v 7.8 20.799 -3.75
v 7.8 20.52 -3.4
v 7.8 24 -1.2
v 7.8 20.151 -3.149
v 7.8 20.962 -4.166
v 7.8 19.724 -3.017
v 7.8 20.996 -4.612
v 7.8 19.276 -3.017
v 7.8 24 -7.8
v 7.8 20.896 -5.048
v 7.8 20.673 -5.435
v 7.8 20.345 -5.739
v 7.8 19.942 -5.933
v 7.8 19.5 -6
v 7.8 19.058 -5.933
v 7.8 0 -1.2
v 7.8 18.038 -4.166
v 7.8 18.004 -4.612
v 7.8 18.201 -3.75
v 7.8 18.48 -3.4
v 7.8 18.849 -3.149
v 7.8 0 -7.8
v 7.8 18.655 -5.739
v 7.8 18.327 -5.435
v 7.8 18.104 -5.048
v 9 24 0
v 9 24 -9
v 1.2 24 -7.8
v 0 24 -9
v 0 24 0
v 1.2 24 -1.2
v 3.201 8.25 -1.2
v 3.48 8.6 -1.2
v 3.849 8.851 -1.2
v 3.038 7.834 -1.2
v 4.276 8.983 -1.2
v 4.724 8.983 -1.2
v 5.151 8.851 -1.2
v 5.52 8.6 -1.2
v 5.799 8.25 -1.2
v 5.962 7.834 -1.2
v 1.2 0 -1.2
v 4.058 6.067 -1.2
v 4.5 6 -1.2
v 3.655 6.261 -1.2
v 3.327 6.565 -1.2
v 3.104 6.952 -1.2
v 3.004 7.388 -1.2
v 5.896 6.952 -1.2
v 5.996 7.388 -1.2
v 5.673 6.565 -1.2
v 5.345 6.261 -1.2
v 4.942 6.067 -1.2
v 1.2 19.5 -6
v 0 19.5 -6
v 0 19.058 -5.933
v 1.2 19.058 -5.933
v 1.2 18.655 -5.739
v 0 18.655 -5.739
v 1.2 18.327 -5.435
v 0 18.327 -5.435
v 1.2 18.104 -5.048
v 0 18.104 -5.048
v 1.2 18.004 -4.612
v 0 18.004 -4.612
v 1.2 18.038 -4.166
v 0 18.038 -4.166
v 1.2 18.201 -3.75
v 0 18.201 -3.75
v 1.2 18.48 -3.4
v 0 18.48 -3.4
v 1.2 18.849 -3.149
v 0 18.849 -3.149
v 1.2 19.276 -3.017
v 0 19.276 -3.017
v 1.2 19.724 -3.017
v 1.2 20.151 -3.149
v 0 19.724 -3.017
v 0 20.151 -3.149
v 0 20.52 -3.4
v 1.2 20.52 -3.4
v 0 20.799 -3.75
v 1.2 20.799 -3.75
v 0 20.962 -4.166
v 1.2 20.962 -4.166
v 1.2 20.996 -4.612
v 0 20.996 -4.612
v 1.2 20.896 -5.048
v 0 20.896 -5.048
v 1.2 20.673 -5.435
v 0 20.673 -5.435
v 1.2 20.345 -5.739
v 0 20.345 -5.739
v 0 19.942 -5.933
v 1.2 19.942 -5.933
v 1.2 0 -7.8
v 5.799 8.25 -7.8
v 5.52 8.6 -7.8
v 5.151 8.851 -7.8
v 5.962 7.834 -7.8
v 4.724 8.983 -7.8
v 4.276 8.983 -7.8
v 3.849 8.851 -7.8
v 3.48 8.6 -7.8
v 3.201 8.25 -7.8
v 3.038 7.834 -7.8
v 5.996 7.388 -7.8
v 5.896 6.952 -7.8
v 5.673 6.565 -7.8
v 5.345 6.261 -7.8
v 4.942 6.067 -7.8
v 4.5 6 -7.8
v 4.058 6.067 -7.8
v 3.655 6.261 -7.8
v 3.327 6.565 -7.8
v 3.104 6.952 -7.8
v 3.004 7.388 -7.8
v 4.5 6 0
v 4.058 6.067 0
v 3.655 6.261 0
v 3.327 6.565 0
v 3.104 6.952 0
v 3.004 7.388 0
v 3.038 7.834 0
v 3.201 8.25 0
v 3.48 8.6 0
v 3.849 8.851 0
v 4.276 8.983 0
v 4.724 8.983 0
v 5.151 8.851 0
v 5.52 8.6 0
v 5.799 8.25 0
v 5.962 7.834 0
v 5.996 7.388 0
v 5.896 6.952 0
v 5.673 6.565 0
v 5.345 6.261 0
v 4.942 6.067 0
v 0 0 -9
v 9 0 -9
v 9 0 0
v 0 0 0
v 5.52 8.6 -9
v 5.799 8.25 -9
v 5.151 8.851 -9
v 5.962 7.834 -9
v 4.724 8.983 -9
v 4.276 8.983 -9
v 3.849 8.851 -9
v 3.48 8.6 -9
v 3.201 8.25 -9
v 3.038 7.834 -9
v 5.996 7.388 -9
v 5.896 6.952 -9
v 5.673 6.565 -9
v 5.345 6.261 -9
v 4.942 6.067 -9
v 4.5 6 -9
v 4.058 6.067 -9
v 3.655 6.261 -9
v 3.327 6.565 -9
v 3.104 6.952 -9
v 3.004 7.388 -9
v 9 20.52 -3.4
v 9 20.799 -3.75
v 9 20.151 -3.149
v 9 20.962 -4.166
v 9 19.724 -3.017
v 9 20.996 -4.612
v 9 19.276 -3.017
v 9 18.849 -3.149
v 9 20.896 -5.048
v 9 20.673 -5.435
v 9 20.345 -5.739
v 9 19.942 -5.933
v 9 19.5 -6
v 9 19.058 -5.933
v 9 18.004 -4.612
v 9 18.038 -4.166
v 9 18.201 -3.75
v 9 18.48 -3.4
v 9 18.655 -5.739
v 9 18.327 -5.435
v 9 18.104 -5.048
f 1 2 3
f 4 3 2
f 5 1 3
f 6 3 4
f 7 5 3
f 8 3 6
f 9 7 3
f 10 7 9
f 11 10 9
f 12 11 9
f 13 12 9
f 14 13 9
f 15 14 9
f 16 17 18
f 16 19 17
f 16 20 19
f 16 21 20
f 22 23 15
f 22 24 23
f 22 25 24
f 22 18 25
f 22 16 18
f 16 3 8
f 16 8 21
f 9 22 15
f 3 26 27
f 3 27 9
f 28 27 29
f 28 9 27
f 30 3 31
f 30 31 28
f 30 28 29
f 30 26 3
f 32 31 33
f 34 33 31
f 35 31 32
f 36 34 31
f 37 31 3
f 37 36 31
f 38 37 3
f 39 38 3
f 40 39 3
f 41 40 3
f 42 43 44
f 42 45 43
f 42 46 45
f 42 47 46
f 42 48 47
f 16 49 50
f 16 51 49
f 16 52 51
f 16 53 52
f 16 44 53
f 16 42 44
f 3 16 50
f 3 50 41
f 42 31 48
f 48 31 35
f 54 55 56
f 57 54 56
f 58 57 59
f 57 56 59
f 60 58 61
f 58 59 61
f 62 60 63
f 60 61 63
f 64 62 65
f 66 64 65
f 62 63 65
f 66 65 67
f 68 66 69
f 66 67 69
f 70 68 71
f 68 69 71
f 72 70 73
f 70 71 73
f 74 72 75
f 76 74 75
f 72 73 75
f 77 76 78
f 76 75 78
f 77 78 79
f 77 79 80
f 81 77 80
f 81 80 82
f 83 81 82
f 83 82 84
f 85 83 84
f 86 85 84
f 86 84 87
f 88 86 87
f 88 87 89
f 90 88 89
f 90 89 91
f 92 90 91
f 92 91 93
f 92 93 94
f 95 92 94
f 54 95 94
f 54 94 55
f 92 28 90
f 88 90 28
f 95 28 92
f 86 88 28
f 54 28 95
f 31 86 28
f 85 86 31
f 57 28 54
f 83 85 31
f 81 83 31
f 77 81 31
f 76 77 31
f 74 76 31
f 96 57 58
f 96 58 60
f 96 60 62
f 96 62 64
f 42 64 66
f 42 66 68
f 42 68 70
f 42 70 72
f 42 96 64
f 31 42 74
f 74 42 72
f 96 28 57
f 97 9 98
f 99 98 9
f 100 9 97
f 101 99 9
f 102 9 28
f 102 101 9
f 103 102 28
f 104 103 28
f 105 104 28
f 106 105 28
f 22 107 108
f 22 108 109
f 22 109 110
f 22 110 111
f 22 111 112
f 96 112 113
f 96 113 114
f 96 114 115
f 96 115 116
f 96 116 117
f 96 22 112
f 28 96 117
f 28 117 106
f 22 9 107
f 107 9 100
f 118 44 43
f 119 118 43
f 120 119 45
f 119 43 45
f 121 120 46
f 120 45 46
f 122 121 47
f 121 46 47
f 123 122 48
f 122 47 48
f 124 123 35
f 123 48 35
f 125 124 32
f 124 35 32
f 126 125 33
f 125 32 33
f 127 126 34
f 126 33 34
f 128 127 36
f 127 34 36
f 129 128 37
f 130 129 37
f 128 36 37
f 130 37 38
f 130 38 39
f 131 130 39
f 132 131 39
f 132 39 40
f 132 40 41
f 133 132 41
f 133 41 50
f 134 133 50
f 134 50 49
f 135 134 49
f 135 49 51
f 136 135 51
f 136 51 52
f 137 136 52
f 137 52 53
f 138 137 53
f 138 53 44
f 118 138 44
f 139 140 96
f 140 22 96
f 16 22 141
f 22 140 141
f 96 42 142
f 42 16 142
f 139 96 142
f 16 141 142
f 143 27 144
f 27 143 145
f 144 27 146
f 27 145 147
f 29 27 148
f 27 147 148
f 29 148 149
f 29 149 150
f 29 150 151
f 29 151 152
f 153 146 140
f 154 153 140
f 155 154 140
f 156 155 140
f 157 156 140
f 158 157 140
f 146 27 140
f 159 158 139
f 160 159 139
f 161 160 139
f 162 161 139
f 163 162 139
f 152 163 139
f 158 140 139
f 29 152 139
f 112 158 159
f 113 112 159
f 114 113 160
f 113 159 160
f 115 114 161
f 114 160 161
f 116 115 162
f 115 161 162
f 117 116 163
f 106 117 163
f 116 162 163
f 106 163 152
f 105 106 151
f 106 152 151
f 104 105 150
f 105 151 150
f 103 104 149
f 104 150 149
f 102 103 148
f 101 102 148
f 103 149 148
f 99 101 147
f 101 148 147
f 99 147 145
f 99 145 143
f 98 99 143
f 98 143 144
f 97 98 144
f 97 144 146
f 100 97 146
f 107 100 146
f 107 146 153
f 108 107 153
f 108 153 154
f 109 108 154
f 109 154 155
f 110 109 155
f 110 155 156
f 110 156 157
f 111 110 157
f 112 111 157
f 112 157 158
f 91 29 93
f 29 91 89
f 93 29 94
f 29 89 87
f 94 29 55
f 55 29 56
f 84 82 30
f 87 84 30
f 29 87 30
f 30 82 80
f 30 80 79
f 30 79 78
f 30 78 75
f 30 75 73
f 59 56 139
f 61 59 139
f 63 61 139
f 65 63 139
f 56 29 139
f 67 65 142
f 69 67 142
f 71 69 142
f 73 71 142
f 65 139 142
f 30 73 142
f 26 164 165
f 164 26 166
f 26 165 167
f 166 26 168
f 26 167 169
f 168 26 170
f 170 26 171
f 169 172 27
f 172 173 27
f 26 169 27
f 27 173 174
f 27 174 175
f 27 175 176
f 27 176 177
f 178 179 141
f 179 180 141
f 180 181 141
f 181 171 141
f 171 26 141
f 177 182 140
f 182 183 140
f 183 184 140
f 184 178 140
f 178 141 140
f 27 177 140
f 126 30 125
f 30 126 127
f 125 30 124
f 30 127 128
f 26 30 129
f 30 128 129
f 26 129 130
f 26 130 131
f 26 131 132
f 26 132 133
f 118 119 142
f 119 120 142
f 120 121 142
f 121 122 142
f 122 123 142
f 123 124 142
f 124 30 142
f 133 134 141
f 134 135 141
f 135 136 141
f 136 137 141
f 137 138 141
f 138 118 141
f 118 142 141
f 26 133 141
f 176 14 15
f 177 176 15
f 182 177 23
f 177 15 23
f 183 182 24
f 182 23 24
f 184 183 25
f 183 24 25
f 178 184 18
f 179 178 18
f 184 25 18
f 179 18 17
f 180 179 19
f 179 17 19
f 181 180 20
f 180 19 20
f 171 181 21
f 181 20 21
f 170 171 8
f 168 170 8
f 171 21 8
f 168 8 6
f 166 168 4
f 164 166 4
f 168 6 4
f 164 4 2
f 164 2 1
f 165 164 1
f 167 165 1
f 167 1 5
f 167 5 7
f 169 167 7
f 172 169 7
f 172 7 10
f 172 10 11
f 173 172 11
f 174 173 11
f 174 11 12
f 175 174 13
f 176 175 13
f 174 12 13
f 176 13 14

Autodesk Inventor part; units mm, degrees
ref_plane "YZ Plane" through (0, 0, 0) normal (1, 0, 0) x (0, 1, 0)
ref_plane "XZ Plane" through (0, 0, 0) normal (0, 1, 0) x (-1, 0, 0)
ref_plane "XY Plane" through (0, 0, 0) normal (0, 0, 1) x (1, 0, 0)
sketch "スケッチ1" plane through (0, 0, 0) normal (0, 1, 0) x (-1, 0, 0)
  line L0 (0, 0) -> (-9, 0)
  line L1 (-9, 0) -> (-9, -9)
  line L2 (-9, -9) -> (0, -9)
  line L3 (0, -9) -> (0, 0)
  line L4 (-1.2, -1.2) -> (-7.8, -1.2)
  line L5 (-7.8, -1.2) -> (-7.8, -7.8)
  line L6 (-7.8, -7.8) -> (-1.2, -7.8)
  line L7 (-1.2, -7.8) -> (-1.2, -1.2)
  dimension "d0" = 9
  dimension "d1" = 9
  dimension "d2" = 6.6
  dimension "d3" = 6.6
  dimension "d4" = 1.2
  dimension "d5" = 1.2
extrude "押し出し1" add sketch "スケッチ1" along normal blind 24
sketch "スケッチ2" plane through (0, 0, 0) normal (0, 0, 1) x (1, 0, 0)
  line L0 (0, 0) -> (9, 0) projected
  line L1 (9, 0) -> (9, 24) projected
  point P0 (4.5, 7.5)
  dimension "d8" = 7.5
  dimension "d9" = 4.5
hole "穴1" at (4.5, 7.5, 0) direction (0, 0, -1) diameter 3 end through all
sketch "スケッチ3" plane through (9, 0, 0) normal (1, 0, 0) x (0, 0, -1)
  line L0 (0, 24) -> (9, 24) projected
  line L1 (9, 0) -> (9, 24) projected
  point P0 (0, 0)
  point P1 (4.5, 19.5)
  dimension "d17" = 4.5
  dimension "d18" = 4.5
hole "穴2" at (9, 19.5, -4.5) direction (-1, 0, 0) diameter 3 end through all
equation "\"d5\" = d4"
equation "\"d18\" = d17"
properties part number "前後直動9x9x24" material "アルミニウム 6061"
